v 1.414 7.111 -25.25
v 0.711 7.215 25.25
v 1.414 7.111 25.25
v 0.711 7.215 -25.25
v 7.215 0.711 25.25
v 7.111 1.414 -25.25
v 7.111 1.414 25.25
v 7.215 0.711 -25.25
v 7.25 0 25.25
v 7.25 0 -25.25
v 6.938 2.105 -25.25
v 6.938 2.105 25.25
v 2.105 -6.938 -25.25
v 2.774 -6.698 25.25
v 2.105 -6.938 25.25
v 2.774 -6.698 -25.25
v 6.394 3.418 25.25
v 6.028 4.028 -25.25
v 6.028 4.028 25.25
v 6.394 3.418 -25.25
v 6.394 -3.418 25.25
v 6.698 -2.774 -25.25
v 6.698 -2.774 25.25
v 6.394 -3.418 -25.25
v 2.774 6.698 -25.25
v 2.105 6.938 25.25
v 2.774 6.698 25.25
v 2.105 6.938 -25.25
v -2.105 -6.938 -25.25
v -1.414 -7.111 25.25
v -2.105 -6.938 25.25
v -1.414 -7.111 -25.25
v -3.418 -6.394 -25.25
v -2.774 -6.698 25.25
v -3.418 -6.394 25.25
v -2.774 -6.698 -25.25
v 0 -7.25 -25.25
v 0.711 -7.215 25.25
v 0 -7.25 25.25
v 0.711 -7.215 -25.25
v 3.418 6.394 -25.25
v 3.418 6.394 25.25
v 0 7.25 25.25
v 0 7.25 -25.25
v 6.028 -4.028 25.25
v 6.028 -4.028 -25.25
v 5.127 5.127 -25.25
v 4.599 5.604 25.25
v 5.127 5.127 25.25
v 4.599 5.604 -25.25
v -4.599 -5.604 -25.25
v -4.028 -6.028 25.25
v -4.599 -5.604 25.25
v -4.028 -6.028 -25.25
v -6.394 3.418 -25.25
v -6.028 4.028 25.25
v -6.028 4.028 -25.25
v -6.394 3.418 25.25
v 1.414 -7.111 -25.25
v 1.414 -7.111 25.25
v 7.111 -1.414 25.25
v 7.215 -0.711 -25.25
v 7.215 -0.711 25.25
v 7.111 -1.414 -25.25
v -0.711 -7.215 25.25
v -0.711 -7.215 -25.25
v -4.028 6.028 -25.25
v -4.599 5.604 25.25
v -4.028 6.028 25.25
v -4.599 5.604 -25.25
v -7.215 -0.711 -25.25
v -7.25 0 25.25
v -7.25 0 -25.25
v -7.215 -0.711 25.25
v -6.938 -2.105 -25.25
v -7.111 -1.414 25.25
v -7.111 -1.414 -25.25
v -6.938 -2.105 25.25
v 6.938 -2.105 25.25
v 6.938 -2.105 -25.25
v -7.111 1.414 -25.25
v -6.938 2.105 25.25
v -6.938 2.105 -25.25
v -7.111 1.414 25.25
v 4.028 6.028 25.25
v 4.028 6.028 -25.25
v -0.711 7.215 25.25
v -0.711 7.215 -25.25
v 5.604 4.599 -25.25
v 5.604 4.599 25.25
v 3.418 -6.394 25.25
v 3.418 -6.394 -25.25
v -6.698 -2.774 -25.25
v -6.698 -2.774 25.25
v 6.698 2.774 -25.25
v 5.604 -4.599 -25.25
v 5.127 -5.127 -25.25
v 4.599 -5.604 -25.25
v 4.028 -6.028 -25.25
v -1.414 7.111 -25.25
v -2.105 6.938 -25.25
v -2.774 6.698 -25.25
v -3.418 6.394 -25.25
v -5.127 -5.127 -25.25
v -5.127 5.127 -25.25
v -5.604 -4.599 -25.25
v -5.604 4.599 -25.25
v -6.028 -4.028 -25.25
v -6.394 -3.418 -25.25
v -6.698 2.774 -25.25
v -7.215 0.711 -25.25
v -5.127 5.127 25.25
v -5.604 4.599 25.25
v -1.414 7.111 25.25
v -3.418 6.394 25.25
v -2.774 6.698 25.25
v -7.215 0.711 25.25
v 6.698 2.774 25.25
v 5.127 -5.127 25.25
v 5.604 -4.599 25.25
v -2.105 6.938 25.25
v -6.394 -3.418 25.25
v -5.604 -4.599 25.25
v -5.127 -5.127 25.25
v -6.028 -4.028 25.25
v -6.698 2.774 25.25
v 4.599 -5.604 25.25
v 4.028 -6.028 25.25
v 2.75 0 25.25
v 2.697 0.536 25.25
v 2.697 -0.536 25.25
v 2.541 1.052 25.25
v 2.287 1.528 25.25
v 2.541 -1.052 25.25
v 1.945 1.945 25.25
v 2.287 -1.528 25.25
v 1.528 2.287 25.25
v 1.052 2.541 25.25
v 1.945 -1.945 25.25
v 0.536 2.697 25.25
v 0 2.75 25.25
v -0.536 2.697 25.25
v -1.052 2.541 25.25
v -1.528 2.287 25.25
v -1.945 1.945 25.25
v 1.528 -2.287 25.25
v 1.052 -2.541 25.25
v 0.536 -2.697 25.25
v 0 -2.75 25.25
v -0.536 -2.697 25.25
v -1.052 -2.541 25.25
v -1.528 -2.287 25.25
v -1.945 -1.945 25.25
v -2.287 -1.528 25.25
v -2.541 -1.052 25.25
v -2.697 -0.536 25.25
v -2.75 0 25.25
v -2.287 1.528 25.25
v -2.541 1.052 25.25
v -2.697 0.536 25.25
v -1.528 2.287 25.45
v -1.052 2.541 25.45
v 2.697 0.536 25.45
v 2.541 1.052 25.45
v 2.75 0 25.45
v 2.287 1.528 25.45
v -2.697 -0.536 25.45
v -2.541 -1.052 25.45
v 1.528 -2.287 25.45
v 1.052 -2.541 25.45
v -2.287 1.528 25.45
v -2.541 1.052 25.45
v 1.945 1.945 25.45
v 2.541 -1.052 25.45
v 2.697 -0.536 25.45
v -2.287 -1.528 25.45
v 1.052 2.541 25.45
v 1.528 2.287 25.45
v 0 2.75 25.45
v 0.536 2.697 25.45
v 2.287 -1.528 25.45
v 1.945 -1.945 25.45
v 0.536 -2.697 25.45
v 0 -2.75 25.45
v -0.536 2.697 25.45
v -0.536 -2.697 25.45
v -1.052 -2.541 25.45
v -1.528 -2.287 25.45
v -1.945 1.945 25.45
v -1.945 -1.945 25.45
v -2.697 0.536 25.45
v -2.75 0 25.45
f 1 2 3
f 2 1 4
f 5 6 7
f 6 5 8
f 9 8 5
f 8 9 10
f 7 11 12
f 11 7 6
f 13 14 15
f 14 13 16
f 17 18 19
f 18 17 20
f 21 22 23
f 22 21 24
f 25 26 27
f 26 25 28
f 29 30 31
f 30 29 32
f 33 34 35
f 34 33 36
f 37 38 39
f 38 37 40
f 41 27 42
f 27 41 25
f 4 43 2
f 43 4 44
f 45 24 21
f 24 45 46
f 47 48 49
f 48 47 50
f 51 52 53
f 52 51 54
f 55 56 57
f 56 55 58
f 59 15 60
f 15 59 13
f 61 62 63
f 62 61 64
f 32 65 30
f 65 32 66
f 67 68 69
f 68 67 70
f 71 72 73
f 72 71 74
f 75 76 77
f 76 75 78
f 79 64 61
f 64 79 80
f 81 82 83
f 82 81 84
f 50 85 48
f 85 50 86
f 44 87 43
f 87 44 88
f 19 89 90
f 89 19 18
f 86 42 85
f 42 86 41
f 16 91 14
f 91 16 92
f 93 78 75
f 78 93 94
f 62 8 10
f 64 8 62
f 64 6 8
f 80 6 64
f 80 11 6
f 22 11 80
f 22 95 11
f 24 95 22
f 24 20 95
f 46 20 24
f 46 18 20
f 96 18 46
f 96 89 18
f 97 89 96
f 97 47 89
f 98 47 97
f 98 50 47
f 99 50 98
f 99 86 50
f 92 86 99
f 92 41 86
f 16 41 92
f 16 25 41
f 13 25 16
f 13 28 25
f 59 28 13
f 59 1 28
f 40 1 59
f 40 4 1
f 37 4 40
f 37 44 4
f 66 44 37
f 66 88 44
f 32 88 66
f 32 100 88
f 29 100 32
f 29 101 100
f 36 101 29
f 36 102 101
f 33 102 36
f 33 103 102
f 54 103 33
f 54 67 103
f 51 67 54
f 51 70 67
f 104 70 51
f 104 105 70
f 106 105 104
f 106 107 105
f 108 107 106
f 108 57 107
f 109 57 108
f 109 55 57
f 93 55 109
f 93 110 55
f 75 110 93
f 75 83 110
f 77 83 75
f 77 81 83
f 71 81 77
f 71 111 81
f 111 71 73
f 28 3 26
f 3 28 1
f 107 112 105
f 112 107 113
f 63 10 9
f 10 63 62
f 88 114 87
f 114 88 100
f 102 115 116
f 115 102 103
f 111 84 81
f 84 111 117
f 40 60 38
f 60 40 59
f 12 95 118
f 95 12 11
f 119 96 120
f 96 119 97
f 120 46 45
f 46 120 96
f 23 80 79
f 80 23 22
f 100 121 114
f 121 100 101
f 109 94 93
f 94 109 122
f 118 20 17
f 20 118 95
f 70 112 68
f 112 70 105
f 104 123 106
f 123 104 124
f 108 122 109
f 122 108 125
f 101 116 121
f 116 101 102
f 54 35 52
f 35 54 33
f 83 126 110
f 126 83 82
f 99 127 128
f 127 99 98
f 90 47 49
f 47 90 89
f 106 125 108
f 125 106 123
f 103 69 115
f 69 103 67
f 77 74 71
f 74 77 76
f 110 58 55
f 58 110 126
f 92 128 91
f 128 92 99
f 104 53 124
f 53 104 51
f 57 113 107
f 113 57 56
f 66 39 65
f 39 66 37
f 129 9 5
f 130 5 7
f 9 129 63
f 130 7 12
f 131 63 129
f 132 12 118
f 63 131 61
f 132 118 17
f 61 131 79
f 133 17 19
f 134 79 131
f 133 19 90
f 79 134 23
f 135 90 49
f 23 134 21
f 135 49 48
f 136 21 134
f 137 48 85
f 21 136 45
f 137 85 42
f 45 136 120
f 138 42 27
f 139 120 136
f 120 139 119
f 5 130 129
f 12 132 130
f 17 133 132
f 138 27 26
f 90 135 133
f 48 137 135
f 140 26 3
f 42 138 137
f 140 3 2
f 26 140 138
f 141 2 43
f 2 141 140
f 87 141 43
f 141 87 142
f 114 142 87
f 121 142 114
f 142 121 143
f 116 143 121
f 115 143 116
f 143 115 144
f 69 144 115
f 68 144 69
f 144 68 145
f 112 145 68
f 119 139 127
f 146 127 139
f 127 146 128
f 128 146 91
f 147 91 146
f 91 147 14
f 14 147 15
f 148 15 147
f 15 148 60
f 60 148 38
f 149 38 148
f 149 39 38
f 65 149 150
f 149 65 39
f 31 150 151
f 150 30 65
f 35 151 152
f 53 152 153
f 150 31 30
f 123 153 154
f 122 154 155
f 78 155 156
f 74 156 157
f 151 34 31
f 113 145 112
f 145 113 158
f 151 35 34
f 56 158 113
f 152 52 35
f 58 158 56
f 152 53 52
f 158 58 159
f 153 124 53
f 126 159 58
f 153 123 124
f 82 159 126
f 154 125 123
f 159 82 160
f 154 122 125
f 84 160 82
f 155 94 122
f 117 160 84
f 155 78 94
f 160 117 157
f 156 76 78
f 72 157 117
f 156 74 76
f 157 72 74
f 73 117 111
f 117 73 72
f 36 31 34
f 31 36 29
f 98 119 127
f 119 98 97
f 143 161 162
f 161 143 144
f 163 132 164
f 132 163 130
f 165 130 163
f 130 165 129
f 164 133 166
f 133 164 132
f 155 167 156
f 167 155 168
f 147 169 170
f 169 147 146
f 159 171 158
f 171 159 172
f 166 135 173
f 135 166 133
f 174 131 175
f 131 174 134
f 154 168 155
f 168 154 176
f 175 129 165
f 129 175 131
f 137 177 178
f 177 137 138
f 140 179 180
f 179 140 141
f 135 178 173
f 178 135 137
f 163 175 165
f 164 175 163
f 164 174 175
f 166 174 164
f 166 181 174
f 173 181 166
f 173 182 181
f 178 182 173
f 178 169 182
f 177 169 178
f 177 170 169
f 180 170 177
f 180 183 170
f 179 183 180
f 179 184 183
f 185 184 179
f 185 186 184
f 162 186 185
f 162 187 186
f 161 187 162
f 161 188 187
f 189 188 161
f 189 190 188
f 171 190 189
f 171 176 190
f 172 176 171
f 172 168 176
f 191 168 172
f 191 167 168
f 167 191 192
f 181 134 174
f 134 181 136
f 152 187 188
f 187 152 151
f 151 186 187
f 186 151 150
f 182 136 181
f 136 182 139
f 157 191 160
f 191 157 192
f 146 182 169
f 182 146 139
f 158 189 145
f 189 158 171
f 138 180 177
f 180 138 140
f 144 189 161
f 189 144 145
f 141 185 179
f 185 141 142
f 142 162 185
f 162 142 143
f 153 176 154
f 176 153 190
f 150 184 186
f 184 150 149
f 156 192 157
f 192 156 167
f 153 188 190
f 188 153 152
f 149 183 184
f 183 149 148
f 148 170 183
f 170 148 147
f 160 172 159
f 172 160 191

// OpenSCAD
// Parameters
height_mm = 50.5; //[25.25:101:0.1]
diameter_mm = 14.5; //[7.25:29:0.1]
positive_terminal_diameter_mm = 5.5; //[2.75:11:0.1]
positive_terminal_height_mm = 1; //[0.5:2:0.05]
negative_terminal_diameter_mm = 6; //[3:12:0.1]
negative_terminal_height_mm = 0.2; //[0.1:0.4:0.01]
terminal_overlap_mm = 0.8; //[0.5:2:0.1]

// Battery - complete geometry
module battery() {
  union() {
    // Cylindrical cell body
    color("DimGray") {
      translate([0, 0, 0])
        cylinder(h=height_mm, r=diameter_mm/2, center=true, $fn=64);
    }
    
    // Positive terminal button
    color("Silver") {
      translate([0, 0, height_mm/2 + positive_terminal_height_mm/2 - terminal_overlap_mm])
        cylinder(h=positive_terminal_height_mm, r=positive_terminal_diameter_mm/2, center=true, $fn=32);
    }
    
    // Negative terminal contact
    color("Silver") {
      translate([0, 0, -height_mm/2 - negative_terminal_height_mm/2 + terminal_overlap_mm])
        cylinder(h=negative_terminal_height_mm, r=negative_terminal_diameter_mm/2, center=true, $fn=32);
    }
  }
}

// Assembly
module assembly() {
  battery();
}

assembly();
